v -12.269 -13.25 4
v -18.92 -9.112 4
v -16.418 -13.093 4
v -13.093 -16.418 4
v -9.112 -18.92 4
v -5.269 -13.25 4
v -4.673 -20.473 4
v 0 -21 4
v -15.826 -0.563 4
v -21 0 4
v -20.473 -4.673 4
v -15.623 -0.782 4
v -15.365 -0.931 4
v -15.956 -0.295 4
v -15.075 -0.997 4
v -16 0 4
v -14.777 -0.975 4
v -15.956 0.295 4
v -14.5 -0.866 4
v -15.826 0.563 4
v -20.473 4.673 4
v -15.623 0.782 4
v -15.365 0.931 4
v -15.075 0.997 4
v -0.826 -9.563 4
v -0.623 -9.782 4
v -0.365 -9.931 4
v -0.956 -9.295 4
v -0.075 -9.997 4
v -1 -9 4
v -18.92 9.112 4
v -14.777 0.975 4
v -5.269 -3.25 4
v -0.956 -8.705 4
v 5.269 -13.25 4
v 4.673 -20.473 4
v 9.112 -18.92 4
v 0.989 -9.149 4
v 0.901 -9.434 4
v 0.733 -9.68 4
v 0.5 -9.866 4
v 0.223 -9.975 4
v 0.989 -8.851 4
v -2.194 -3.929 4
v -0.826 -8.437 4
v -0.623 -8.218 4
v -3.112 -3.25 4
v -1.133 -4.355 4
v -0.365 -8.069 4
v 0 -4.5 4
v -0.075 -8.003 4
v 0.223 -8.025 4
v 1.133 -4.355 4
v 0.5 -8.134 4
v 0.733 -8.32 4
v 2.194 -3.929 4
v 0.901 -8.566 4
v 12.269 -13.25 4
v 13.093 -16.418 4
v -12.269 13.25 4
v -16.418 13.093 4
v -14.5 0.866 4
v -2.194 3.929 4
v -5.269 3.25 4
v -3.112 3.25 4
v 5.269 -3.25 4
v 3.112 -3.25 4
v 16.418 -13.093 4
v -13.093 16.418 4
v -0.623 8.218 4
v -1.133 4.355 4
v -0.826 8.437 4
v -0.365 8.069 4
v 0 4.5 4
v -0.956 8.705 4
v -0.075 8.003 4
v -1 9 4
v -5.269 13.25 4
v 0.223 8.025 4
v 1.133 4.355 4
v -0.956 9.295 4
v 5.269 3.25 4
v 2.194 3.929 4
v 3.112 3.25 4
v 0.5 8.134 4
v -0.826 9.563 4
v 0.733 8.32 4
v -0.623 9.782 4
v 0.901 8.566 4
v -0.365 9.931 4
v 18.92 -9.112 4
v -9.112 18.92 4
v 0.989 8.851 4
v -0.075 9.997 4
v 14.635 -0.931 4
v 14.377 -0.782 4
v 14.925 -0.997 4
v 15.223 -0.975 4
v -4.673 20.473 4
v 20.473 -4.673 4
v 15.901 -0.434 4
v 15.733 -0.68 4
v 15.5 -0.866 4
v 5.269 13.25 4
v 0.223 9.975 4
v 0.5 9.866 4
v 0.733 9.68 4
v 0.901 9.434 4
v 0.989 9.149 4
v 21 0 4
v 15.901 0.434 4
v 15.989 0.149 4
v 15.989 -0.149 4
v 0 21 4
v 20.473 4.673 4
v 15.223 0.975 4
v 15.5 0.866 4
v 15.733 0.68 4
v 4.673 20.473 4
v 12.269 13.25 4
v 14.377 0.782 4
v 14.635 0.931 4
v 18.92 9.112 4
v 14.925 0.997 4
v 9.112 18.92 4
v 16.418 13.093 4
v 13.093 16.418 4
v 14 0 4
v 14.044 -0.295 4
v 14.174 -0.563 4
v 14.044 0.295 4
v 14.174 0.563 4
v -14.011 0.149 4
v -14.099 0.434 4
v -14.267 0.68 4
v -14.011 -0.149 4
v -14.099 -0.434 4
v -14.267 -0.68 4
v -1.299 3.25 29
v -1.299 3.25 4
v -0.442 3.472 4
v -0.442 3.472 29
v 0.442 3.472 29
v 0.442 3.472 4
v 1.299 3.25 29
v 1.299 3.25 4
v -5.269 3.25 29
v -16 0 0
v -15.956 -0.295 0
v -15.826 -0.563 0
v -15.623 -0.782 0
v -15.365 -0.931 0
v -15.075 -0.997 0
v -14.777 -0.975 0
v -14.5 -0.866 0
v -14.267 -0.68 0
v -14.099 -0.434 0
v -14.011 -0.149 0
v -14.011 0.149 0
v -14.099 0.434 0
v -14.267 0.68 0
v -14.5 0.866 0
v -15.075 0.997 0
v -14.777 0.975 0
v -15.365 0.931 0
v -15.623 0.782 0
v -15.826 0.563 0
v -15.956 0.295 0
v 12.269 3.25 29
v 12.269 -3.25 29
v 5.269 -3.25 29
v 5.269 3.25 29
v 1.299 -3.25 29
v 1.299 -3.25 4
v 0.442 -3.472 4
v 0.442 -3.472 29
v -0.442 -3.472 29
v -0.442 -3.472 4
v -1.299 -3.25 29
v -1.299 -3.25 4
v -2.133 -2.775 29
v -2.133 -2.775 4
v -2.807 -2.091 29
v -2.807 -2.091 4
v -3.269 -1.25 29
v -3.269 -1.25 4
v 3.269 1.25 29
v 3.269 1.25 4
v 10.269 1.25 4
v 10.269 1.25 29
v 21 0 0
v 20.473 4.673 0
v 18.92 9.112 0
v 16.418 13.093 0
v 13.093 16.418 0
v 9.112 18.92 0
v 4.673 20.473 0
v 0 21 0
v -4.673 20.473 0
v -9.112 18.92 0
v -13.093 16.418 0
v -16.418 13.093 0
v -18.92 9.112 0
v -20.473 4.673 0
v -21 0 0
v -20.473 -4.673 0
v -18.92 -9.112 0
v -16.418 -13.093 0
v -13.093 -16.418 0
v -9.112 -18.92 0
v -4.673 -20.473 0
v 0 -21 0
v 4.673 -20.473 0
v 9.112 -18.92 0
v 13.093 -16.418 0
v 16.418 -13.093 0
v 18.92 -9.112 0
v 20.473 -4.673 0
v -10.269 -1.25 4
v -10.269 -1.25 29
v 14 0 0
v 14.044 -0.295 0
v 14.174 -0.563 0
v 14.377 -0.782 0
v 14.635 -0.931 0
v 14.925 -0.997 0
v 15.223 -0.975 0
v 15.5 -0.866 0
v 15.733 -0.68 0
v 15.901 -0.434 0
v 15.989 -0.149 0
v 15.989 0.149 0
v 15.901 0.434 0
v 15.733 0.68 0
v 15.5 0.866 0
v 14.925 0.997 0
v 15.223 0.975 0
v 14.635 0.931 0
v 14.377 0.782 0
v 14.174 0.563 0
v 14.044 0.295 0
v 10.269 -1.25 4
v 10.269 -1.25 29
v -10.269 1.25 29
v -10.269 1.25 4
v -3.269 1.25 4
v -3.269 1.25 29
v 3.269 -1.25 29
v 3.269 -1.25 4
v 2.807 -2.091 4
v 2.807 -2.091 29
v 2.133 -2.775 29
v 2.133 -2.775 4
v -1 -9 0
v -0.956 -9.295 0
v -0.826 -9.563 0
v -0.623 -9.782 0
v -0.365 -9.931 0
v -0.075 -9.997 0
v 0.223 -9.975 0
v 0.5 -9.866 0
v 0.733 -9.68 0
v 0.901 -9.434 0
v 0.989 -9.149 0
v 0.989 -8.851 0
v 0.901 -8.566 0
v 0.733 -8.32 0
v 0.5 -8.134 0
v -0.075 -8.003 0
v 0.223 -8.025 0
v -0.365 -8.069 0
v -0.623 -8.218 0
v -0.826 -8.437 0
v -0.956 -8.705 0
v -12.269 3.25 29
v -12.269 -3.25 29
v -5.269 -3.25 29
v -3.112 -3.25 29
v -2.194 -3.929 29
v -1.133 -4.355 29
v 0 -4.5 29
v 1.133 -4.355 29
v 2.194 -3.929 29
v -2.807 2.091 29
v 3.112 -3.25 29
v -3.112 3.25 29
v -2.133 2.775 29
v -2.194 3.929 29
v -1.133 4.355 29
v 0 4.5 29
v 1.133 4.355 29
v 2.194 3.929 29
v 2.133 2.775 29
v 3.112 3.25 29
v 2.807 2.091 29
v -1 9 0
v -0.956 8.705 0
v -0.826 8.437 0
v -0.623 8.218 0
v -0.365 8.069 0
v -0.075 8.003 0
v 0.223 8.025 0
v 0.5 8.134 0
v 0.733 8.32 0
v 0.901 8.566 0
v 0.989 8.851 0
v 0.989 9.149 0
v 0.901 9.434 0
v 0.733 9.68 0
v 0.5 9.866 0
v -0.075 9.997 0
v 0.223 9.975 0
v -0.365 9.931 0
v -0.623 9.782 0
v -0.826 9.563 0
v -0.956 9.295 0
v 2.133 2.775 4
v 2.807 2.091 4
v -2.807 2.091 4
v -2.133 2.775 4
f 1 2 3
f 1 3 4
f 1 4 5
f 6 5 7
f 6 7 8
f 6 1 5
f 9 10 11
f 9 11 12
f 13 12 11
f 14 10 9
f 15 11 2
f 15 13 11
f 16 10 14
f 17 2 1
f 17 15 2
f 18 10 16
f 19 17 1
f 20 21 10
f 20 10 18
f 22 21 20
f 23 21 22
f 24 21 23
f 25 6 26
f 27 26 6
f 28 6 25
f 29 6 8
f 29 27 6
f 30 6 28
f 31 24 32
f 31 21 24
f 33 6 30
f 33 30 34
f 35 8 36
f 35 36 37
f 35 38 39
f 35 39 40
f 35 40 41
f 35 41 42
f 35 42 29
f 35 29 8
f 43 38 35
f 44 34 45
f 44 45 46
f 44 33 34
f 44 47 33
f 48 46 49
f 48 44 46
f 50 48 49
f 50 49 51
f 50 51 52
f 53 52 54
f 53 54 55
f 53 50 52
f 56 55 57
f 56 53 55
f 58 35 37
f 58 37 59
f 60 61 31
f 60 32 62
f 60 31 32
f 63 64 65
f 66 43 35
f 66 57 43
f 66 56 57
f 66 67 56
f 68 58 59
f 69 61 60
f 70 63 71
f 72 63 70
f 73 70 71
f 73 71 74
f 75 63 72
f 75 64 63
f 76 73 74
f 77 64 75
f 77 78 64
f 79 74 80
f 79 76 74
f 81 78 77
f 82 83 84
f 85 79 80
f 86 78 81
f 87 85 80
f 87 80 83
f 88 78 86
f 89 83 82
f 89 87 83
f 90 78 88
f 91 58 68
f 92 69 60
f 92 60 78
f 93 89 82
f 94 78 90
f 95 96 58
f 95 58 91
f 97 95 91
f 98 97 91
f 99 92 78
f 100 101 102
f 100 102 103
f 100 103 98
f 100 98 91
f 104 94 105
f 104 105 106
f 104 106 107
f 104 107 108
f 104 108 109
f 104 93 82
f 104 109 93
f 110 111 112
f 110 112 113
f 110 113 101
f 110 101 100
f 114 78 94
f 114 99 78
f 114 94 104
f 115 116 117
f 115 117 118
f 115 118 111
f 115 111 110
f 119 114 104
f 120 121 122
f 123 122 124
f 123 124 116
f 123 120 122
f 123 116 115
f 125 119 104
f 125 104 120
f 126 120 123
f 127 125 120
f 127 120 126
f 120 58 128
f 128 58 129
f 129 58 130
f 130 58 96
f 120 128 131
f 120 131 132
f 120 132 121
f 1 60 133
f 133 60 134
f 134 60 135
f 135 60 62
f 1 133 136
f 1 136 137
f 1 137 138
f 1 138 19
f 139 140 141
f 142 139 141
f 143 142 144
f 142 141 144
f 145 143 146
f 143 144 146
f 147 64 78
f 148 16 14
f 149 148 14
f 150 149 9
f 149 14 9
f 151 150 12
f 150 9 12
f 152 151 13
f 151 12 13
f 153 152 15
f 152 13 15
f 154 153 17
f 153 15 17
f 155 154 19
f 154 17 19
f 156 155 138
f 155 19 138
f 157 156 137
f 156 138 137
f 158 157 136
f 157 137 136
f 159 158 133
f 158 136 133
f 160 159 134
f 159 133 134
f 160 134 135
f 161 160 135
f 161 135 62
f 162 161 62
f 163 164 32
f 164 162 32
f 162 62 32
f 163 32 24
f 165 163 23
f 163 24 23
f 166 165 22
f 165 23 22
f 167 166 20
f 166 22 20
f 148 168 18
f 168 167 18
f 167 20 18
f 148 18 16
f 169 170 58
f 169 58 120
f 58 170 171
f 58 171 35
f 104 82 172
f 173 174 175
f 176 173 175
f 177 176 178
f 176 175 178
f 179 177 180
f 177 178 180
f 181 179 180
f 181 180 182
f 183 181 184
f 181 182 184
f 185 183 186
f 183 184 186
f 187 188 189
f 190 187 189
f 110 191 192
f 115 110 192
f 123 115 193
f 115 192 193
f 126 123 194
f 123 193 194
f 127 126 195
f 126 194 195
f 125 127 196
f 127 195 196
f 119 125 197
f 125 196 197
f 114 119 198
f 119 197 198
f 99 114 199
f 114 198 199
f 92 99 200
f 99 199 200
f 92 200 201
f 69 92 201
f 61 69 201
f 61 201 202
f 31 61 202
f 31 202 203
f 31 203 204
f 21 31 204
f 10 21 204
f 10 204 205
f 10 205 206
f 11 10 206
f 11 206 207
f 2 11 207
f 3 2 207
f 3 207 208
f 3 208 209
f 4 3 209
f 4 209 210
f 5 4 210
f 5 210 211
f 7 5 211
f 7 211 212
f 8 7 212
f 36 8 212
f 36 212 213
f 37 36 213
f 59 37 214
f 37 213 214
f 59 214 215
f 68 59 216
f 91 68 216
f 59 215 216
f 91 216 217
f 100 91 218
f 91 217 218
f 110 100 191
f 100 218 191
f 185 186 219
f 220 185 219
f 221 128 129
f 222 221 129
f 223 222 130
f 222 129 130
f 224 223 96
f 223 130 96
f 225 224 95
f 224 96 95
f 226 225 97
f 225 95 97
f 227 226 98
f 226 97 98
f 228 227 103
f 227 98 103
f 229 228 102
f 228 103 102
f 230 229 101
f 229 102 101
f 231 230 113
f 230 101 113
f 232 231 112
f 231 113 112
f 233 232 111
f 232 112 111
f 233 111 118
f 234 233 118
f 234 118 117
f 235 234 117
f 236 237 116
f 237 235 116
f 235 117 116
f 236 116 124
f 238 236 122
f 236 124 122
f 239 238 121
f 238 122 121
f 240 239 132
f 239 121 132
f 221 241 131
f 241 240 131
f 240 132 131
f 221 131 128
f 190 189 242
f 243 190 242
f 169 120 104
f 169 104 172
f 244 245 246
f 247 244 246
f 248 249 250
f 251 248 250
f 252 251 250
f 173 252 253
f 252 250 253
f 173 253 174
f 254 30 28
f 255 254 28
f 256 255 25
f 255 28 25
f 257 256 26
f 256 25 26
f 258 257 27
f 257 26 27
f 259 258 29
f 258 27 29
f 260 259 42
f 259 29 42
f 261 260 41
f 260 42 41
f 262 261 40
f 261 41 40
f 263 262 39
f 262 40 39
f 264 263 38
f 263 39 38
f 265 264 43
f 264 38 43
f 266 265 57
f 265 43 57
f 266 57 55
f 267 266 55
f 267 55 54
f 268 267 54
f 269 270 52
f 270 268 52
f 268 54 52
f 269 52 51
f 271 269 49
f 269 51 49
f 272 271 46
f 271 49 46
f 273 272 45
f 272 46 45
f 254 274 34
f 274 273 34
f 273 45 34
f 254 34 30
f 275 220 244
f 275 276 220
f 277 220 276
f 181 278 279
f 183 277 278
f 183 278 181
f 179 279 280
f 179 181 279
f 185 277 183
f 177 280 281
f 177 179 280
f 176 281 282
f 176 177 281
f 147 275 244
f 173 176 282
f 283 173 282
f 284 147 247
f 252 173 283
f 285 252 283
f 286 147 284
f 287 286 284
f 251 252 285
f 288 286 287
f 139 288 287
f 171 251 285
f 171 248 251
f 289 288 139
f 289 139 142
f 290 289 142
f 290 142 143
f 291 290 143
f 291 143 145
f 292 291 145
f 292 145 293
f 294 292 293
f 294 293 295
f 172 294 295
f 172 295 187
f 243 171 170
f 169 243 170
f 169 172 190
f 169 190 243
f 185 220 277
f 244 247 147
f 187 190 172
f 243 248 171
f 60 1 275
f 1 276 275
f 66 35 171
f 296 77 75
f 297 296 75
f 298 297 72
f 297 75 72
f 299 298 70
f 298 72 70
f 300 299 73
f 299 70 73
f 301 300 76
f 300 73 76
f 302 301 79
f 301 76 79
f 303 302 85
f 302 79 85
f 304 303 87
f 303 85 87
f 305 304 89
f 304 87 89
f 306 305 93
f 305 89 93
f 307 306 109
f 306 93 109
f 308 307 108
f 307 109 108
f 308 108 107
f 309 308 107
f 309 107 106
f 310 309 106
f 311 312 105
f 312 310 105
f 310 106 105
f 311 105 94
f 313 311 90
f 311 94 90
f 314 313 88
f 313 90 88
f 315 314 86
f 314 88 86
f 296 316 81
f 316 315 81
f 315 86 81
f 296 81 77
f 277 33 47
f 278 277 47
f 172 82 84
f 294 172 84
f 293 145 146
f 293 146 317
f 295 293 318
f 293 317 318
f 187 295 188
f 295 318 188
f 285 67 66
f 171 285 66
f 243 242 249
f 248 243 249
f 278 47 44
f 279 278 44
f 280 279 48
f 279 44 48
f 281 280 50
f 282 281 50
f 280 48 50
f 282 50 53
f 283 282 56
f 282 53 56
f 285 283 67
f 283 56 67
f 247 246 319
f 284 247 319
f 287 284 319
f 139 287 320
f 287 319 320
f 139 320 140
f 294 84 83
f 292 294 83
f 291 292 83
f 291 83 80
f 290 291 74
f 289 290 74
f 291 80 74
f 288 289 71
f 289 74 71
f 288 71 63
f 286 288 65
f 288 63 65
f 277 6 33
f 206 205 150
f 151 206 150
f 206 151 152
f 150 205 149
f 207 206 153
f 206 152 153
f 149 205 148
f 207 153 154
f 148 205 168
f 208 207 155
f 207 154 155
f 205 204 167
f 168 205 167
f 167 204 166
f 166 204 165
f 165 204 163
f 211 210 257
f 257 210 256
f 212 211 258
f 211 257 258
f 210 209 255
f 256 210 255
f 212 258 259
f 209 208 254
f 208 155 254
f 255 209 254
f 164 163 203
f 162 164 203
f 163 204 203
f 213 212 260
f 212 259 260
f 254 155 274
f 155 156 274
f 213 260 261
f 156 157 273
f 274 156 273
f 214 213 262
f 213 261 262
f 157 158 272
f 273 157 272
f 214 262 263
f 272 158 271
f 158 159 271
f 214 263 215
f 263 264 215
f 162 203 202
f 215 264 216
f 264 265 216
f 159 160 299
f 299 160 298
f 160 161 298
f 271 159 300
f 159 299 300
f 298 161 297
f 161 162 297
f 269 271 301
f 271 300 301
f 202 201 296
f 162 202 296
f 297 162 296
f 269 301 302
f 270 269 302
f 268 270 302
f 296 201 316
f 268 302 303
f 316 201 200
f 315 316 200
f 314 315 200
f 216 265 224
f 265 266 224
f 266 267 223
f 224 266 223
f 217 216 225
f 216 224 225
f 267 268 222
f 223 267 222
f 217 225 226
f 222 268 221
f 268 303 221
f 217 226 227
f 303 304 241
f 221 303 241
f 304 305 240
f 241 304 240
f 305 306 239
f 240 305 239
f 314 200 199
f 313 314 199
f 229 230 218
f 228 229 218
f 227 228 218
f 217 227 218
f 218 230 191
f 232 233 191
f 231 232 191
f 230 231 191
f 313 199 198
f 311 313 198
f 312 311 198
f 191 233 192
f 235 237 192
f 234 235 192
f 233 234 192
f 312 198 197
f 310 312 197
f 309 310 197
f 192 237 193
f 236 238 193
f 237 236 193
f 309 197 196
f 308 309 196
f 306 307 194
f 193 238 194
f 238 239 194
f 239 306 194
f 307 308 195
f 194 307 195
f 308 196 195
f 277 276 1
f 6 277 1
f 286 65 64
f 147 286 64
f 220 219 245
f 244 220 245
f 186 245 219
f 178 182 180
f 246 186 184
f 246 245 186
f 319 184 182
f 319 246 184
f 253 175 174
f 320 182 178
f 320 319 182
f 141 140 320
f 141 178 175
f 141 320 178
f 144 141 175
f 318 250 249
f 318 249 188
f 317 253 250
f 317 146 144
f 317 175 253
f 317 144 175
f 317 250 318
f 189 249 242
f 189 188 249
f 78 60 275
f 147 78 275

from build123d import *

# Parameters (mm, degrees)
F0_R     = 21
F1_DEPTH = 4
F2_D     = 2
F4_DEPTH = 25
F6_DEPTH = 7


with BuildPart() as f1:
    # F0 (on Top) → F1 (new body)
    with BuildSketch(Plane.XY):
        Circle(F0_R)
    extrude(amount=F1_DEPTH)

    # F2 (through all)
    with Locations(Plane(origin=(0, 0, 0), x_dir=(1, 0, 0), z_dir=(0, 0, -1))):
        with Locations((-15, 0), (0, 9), (0, -9), (15, 0)):
            Hole(F2_D / 2)

    # F3 (on face) → F4 (join)
    with BuildSketch(Plane.XY.offset(4)):
        with BuildLine():
            ThreePointArc((-4.3229041164, 1.25), (-3.8498331493, 2.3299752622), (-3.1124748995, 3.25))
            Line((-3.1124748995, 3.25), (-12.2691742077, 3.25))
            Line((-12.2691742077, 3.25), (-12.2691742077, -3.25))
            Line((-12.2691742077, -3.25), (-3.1124748995, -3.25))
            ThreePointArc((-3.1124748995, -3.25), (-3.8498331493, -2.3299752622), (-4.3229041164, -1.25))
            Line((-4.3229041164, -1.25), (-10.2691742077, -1.25))
            Line((-10.2691742077, -1.25), (-10.2691742077, 1.25))
            Line((-10.2691742077, 1.25), (-4.3229041164, 1.25))
        make_face()
        with BuildLine():
            ThreePointArc((-1.2990381057, 3.25), (0, 3.5), (1.2990381057, 3.25))
            Line((1.2990381057, 3.25), (3.1124748995, 3.25))
            ThreePointArc((3.1124748995, 3.25), (0, 4.5), (-3.1124748995, 3.25))
            Line((-3.1124748995, 3.25), (-1.2990381057, 3.25))
        make_face()
        with BuildLine():
            ThreePointArc((-3.2691742077, 1.25), (-2.4934195265, 2.4561879132), (-1.2990381057, 3.25))
            Line((-1.2990381057, 3.25), (-3.1124748995, 3.25))
            ThreePointArc((-3.1124748995, 3.25), (-3.8498331493, 2.3299752622), (-4.3229041164, 1.25))
            Line((-4.3229041164, 1.25), (-3.2691742077, 1.25))
        make_face()
        with BuildLine():
            Line((-3.1124748995, -3.25), (-1.2990381057, -3.25))
            ThreePointArc((-1.2990381057, -3.25), (-2.4934195265, -2.4561879132), (-3.2691742077, -1.25))
            Line((-3.2691742077, -1.25), (-4.3229041164, -1.25))
            ThreePointArc((-4.3229041164, -1.25), (-3.8498331493, -2.3299752622), (-3.1124748995, -3.25))
        make_face()
        with BuildLine():
            Line((3.1124748995, -3.25), (1.2990381057, -3.25))
            ThreePointArc((1.2990381057, -3.25), (0, -3.5), (-1.2990381057, -3.25))
            Line((-1.2990381057, -3.25), (-3.1124748995, -3.25))
            ThreePointArc((-3.1124748995, -3.25), (0, -4.5), (3.1124748995, -3.25))
        make_face()
        with BuildLine():
            Line((4.3229041164, -1.25), (3.2691742077, -1.25))
            ThreePointArc((3.2691742077, -1.25), (2.4934195265, -2.4561879132), (1.2990381057, -3.25))
            Line((1.2990381057, -3.25), (3.1124748995, -3.25))
            ThreePointArc((3.1124748995, -3.25), (3.8498331493, -2.3299752622), (4.3229041164, -1.25))
        make_face()
        with BuildLine():
            ThreePointArc((1.2990381057, 3.25), (2.4934195265, 2.4561879132), (3.2691742077, 1.25))
            Line((3.2691742077, 1.25), (4.3229041164, 1.25))
            ThreePointArc((4.3229041164, 1.25), (3.8498331493, 2.3299752622), (3.1124748995, 3.25))
            Line((3.1124748995, 3.25), (1.2990381057, 3.25))
        make_face()
        with BuildLine():
            ThreePointArc((3.1124748995, 3.25), (3.8498331493, 2.3299752622), (4.3229041164, 1.25))
            Line((4.3229041164, 1.25), (10.2691742077, 1.25))
            Line((10.2691742077, 1.25), (10.2691742077, -1.25))
            Line((10.2691742077, -1.25), (4.3229041164, -1.25))
            ThreePointArc((4.3229041164, -1.25), (3.8498331493, -2.3299752622), (3.1124748995, -3.25))
            Line((3.1124748995, -3.25), (12.2691742077, -3.25))
            Line((12.2691742077, -3.25), (12.2691742077, 3.25))
            Line((12.2691742077, 3.25), (3.1124748995, 3.25))
        make_face()
    extrude(amount=F4_DEPTH)

    # F5 (on face) → F6 (join)
    with BuildSketch(Plane.YZ.offset(12.2691742077)):
        Polygon((-3.25, 4), (-3.25, 29), (-13.25, 4), align=None)
        Polygon((13.25, 4), (3.25, 29), (3.25, 4), align=None)
    extrude(amount=-F6_DEPTH)

    # F7: F1 across plane


with BuildPart() as f1_1:
    add(f1.part)
    add(f1.part.mirror(Plane.YZ))


solid = f1_1.part
